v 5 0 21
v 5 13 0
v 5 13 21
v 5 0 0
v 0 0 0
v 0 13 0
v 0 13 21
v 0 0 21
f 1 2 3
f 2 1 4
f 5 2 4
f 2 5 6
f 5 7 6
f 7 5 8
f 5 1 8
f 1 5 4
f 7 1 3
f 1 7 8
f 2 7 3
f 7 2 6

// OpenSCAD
translate([2.5, 3.5, 1.5]) color([0.8774574539285279, 0.35307108172351365, 0.4582943249787391]) cube([5, 7, 3], center=true);
translate([2.5, 3.5, 4.5]) color([0.6318794317305464, 0.5161242981674495, 0.9564683485665337]) cube([5, 7, 3], center=true);
translate([2.5, 3.5, 7.5]) color([0.9547176774381221, 0.9297598506094263, 0.9340763496652581]) cube([5, 7, 3], center=true);
translate([2.5, 3.5, 10.5]) color([0.580960135568696, 0.49020206373000297, 0.7041168173823689]) cube([5, 7, 3], center=true);
translate([2.5, 3.5, 13.5]) color([0.21541959298546798, 0.26587203921552827, 0.04380725363309168]) cube([5, 7, 3], center=true);
translate([2.5, 3.5, 16.5]) color([0.16285754255803098, 0.0038745499388105342, 0.6546275765234981]) cube([5, 7, 3], center=true);
translate([2.5, 3.5, 19.5]) color([0.14040698903568194, 0.7866793455760521, 0.680503995881725]) cube([5, 7, 3], center=true);
translate([2.5, 8.5, 3.5]) color([0.9706757933544957, 0.3965144869518913, 0.9213919134510528]) cube([5, 3, 7], center=true);
translate([2.5, 8.5, 10.5]) color([0.4537041723195332, 0.3395037398362071, 0.10233886991705377]) cube([5, 3, 7], center=true);
translate([2.5, 8.5, 17.5]) color([0.8828321850718597, 0.7947901585625868, 0.3229289765350606]) cube([5, 3, 7], center=true);
translate([2.5, 11.5, 3.5]) color([0.45574438492562896, 0.32514346581324827, 0.028829116538094723]) cube([5, 3, 7], center=true);
translate([2.5, 11.5, 8.0]) color([0.04435252539911694, 0.3687041258820589, 0.20959132812878367]) cube([5, 3, 2], center=true);
translate([2.5, 11.5, 10.0]) color([0.5245146032105923, 0.1877850356496189, 0.2016215864664097]) cube([5, 3, 2], center=true);
translate([2.5, 11.5, 12.0]) color([0.6726678813176303, 0.7356026567617159, 0.31223209587410494]) cube([5, 3, 2], center=true);
translate([2.5, 11.5, 14.0]) color([0.8599943994333726, 0.2546391746557106, 0.34394037628155716]) cube([5, 3, 2], center=true);
translate([2.5, 11.5, 16.0]) color([0.712480390369609, 0.04450290132920964, 0.934183460116191]) cube([5, 3, 2], center=true);
translate([2.5, 11.5, 18.0]) color([0.07233773178762537, 0.4609310589380602, 0.7246048259600892]) cube([5, 3, 2], center=true);
translate([2.5, 11.5, 20.0]) color([0.04746853498479808, 0.8090026856371774, 0.9788933433114139]) cube([5, 3, 2], center=true);
